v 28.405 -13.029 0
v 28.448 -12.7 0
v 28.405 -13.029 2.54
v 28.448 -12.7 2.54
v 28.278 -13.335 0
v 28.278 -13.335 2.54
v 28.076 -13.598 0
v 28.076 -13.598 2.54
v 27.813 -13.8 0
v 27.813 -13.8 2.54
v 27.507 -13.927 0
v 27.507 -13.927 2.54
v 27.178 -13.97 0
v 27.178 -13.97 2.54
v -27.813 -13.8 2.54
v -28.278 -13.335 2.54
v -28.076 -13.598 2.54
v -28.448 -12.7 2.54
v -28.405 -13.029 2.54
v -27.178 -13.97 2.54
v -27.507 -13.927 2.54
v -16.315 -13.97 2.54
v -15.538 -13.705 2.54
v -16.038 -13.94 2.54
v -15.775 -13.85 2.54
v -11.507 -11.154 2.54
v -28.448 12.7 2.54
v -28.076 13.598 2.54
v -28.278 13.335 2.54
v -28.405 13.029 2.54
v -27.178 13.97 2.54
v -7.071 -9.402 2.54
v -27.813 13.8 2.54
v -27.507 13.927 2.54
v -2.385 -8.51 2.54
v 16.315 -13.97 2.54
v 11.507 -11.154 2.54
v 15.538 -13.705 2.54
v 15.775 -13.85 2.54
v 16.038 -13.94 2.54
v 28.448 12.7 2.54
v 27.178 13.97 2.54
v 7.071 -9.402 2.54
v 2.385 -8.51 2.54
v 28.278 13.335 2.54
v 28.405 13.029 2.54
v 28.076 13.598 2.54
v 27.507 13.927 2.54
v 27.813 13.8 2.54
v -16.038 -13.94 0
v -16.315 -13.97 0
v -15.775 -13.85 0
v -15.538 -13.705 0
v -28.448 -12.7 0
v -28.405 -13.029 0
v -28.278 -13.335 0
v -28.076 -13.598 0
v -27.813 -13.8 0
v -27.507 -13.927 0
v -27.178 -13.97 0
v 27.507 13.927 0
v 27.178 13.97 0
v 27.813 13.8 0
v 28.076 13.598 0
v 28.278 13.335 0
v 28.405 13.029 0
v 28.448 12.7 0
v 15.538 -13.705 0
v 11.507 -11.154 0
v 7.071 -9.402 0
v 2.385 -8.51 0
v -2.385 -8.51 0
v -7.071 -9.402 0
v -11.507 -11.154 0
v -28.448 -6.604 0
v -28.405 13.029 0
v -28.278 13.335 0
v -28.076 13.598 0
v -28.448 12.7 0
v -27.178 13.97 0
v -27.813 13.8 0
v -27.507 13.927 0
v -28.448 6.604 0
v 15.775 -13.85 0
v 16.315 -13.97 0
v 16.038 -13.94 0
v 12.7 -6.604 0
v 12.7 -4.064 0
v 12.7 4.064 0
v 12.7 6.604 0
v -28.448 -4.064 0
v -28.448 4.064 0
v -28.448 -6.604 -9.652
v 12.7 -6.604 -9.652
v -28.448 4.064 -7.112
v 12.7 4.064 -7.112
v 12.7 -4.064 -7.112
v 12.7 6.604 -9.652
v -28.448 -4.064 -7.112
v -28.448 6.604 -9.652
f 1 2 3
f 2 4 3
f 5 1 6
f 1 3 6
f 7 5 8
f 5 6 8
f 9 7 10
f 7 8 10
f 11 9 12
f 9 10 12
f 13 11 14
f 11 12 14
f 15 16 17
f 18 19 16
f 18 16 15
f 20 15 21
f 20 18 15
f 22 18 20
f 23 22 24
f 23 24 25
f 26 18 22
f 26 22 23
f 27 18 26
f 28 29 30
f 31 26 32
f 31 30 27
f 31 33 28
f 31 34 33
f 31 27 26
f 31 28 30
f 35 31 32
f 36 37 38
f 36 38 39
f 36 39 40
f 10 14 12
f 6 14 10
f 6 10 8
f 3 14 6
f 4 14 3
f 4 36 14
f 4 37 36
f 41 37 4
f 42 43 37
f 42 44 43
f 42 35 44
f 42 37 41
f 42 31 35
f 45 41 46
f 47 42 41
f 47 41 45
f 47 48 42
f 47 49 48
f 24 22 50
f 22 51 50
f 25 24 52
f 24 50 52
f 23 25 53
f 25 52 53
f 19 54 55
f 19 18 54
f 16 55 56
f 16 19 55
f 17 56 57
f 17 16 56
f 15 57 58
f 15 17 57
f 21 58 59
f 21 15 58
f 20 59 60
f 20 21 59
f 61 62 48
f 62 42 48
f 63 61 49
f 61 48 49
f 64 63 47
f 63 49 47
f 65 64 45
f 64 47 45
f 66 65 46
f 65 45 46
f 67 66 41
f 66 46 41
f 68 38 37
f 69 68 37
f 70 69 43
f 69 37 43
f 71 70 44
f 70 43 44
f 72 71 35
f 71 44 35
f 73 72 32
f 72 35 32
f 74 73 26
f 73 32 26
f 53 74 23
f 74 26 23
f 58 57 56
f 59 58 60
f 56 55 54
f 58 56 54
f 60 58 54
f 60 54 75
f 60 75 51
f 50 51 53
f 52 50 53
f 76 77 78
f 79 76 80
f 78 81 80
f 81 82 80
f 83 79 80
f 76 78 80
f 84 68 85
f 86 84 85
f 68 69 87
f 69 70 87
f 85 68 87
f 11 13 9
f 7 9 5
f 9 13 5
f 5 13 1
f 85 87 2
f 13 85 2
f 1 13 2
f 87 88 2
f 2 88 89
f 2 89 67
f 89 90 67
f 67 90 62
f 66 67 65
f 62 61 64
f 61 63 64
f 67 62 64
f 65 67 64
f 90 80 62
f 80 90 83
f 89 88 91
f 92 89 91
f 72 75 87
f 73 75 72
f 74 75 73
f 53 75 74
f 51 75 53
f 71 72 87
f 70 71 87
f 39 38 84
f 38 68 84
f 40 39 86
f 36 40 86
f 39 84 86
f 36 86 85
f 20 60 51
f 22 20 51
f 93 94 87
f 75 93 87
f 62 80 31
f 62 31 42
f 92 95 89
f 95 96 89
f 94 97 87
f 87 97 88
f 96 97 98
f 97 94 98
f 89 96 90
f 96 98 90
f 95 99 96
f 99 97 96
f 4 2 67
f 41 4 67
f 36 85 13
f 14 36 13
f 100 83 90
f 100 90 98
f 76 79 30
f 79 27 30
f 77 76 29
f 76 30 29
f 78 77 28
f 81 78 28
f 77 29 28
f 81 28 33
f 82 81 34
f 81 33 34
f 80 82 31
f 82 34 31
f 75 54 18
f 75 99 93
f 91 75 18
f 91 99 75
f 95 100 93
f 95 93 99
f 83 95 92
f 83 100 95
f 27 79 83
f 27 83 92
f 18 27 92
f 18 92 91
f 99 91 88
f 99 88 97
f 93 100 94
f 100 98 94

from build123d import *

# Parameters (mm, degrees)
SKETCH1_W                = 56.896
SKETCH1_H                = 27.94
BOSS_EXTRUDE1_DEPTH      = 2.54
CUT_EXTRUDE1_DEPTH       = 3.54
FILLET1_R                = 1.27
EXTRUDE_THIN1_DEPTH      = 12.7
EXTRUDE_THIN1_DEPTH_BACK = 28.448


with BuildPart() as part:
    # Sketch1 → Boss-Extrude1 (new body)
    with BuildSketch(Plane.XY):
        Rectangle(SKETCH1_W, SKETCH1_H)
    extrude(amount=BOSS_EXTRUDE1_DEPTH)

    # Sketch2 → Cut-Extrude1 (cut, through all)
    with BuildSketch(Plane.XY.offset(2.54)):
        with BuildLine():
            Line((-15.875, -13.97), (15.875, -13.97))
            ThreePointArc((15.875, -13.97), (0, -8.397868645), (-15.875, -13.97))
        make_face()
    extrude(amount=-CUT_EXTRUDE1_DEPTH, mode=Mode.SUBTRACT)

    # Fillet1
    fillet1_edges = [part.edges().sort_by_distance(p)[0] for p in [
        (-15.875, -13.97, 1.27),
        (15.875, -13.97, 1.27),
        (28.448, -13.97, 1.27),
        (-28.448, -13.97, 1.27),
        (-28.448, 13.97, 1.27),
        (28.448, 13.97, 1.27),
    ]]
    fillet(fillet1_edges, radius=FILLET1_R)

    # Sketch4 → Extrude-Thin1 (add, two sides)
    with BuildSketch(Plane(origin=(0, 0, 0), x_dir=(0, 0, -1), z_dir=(1, 0, 0))) as extrude_thin1_sk:
        Polygon((0, -4.064), (7.112, -4.064), (7.112, 4.064), (0, 4.064), (0, 6.604), (9.652, 6.604), (9.652, -6.604), (0, -6.604), align=None)
    extrude(amount=EXTRUDE_THIN1_DEPTH)
    extrude(extrude_thin1_sk.sketch, amount=-EXTRUDE_THIN1_DEPTH_BACK)


solid = part.part
